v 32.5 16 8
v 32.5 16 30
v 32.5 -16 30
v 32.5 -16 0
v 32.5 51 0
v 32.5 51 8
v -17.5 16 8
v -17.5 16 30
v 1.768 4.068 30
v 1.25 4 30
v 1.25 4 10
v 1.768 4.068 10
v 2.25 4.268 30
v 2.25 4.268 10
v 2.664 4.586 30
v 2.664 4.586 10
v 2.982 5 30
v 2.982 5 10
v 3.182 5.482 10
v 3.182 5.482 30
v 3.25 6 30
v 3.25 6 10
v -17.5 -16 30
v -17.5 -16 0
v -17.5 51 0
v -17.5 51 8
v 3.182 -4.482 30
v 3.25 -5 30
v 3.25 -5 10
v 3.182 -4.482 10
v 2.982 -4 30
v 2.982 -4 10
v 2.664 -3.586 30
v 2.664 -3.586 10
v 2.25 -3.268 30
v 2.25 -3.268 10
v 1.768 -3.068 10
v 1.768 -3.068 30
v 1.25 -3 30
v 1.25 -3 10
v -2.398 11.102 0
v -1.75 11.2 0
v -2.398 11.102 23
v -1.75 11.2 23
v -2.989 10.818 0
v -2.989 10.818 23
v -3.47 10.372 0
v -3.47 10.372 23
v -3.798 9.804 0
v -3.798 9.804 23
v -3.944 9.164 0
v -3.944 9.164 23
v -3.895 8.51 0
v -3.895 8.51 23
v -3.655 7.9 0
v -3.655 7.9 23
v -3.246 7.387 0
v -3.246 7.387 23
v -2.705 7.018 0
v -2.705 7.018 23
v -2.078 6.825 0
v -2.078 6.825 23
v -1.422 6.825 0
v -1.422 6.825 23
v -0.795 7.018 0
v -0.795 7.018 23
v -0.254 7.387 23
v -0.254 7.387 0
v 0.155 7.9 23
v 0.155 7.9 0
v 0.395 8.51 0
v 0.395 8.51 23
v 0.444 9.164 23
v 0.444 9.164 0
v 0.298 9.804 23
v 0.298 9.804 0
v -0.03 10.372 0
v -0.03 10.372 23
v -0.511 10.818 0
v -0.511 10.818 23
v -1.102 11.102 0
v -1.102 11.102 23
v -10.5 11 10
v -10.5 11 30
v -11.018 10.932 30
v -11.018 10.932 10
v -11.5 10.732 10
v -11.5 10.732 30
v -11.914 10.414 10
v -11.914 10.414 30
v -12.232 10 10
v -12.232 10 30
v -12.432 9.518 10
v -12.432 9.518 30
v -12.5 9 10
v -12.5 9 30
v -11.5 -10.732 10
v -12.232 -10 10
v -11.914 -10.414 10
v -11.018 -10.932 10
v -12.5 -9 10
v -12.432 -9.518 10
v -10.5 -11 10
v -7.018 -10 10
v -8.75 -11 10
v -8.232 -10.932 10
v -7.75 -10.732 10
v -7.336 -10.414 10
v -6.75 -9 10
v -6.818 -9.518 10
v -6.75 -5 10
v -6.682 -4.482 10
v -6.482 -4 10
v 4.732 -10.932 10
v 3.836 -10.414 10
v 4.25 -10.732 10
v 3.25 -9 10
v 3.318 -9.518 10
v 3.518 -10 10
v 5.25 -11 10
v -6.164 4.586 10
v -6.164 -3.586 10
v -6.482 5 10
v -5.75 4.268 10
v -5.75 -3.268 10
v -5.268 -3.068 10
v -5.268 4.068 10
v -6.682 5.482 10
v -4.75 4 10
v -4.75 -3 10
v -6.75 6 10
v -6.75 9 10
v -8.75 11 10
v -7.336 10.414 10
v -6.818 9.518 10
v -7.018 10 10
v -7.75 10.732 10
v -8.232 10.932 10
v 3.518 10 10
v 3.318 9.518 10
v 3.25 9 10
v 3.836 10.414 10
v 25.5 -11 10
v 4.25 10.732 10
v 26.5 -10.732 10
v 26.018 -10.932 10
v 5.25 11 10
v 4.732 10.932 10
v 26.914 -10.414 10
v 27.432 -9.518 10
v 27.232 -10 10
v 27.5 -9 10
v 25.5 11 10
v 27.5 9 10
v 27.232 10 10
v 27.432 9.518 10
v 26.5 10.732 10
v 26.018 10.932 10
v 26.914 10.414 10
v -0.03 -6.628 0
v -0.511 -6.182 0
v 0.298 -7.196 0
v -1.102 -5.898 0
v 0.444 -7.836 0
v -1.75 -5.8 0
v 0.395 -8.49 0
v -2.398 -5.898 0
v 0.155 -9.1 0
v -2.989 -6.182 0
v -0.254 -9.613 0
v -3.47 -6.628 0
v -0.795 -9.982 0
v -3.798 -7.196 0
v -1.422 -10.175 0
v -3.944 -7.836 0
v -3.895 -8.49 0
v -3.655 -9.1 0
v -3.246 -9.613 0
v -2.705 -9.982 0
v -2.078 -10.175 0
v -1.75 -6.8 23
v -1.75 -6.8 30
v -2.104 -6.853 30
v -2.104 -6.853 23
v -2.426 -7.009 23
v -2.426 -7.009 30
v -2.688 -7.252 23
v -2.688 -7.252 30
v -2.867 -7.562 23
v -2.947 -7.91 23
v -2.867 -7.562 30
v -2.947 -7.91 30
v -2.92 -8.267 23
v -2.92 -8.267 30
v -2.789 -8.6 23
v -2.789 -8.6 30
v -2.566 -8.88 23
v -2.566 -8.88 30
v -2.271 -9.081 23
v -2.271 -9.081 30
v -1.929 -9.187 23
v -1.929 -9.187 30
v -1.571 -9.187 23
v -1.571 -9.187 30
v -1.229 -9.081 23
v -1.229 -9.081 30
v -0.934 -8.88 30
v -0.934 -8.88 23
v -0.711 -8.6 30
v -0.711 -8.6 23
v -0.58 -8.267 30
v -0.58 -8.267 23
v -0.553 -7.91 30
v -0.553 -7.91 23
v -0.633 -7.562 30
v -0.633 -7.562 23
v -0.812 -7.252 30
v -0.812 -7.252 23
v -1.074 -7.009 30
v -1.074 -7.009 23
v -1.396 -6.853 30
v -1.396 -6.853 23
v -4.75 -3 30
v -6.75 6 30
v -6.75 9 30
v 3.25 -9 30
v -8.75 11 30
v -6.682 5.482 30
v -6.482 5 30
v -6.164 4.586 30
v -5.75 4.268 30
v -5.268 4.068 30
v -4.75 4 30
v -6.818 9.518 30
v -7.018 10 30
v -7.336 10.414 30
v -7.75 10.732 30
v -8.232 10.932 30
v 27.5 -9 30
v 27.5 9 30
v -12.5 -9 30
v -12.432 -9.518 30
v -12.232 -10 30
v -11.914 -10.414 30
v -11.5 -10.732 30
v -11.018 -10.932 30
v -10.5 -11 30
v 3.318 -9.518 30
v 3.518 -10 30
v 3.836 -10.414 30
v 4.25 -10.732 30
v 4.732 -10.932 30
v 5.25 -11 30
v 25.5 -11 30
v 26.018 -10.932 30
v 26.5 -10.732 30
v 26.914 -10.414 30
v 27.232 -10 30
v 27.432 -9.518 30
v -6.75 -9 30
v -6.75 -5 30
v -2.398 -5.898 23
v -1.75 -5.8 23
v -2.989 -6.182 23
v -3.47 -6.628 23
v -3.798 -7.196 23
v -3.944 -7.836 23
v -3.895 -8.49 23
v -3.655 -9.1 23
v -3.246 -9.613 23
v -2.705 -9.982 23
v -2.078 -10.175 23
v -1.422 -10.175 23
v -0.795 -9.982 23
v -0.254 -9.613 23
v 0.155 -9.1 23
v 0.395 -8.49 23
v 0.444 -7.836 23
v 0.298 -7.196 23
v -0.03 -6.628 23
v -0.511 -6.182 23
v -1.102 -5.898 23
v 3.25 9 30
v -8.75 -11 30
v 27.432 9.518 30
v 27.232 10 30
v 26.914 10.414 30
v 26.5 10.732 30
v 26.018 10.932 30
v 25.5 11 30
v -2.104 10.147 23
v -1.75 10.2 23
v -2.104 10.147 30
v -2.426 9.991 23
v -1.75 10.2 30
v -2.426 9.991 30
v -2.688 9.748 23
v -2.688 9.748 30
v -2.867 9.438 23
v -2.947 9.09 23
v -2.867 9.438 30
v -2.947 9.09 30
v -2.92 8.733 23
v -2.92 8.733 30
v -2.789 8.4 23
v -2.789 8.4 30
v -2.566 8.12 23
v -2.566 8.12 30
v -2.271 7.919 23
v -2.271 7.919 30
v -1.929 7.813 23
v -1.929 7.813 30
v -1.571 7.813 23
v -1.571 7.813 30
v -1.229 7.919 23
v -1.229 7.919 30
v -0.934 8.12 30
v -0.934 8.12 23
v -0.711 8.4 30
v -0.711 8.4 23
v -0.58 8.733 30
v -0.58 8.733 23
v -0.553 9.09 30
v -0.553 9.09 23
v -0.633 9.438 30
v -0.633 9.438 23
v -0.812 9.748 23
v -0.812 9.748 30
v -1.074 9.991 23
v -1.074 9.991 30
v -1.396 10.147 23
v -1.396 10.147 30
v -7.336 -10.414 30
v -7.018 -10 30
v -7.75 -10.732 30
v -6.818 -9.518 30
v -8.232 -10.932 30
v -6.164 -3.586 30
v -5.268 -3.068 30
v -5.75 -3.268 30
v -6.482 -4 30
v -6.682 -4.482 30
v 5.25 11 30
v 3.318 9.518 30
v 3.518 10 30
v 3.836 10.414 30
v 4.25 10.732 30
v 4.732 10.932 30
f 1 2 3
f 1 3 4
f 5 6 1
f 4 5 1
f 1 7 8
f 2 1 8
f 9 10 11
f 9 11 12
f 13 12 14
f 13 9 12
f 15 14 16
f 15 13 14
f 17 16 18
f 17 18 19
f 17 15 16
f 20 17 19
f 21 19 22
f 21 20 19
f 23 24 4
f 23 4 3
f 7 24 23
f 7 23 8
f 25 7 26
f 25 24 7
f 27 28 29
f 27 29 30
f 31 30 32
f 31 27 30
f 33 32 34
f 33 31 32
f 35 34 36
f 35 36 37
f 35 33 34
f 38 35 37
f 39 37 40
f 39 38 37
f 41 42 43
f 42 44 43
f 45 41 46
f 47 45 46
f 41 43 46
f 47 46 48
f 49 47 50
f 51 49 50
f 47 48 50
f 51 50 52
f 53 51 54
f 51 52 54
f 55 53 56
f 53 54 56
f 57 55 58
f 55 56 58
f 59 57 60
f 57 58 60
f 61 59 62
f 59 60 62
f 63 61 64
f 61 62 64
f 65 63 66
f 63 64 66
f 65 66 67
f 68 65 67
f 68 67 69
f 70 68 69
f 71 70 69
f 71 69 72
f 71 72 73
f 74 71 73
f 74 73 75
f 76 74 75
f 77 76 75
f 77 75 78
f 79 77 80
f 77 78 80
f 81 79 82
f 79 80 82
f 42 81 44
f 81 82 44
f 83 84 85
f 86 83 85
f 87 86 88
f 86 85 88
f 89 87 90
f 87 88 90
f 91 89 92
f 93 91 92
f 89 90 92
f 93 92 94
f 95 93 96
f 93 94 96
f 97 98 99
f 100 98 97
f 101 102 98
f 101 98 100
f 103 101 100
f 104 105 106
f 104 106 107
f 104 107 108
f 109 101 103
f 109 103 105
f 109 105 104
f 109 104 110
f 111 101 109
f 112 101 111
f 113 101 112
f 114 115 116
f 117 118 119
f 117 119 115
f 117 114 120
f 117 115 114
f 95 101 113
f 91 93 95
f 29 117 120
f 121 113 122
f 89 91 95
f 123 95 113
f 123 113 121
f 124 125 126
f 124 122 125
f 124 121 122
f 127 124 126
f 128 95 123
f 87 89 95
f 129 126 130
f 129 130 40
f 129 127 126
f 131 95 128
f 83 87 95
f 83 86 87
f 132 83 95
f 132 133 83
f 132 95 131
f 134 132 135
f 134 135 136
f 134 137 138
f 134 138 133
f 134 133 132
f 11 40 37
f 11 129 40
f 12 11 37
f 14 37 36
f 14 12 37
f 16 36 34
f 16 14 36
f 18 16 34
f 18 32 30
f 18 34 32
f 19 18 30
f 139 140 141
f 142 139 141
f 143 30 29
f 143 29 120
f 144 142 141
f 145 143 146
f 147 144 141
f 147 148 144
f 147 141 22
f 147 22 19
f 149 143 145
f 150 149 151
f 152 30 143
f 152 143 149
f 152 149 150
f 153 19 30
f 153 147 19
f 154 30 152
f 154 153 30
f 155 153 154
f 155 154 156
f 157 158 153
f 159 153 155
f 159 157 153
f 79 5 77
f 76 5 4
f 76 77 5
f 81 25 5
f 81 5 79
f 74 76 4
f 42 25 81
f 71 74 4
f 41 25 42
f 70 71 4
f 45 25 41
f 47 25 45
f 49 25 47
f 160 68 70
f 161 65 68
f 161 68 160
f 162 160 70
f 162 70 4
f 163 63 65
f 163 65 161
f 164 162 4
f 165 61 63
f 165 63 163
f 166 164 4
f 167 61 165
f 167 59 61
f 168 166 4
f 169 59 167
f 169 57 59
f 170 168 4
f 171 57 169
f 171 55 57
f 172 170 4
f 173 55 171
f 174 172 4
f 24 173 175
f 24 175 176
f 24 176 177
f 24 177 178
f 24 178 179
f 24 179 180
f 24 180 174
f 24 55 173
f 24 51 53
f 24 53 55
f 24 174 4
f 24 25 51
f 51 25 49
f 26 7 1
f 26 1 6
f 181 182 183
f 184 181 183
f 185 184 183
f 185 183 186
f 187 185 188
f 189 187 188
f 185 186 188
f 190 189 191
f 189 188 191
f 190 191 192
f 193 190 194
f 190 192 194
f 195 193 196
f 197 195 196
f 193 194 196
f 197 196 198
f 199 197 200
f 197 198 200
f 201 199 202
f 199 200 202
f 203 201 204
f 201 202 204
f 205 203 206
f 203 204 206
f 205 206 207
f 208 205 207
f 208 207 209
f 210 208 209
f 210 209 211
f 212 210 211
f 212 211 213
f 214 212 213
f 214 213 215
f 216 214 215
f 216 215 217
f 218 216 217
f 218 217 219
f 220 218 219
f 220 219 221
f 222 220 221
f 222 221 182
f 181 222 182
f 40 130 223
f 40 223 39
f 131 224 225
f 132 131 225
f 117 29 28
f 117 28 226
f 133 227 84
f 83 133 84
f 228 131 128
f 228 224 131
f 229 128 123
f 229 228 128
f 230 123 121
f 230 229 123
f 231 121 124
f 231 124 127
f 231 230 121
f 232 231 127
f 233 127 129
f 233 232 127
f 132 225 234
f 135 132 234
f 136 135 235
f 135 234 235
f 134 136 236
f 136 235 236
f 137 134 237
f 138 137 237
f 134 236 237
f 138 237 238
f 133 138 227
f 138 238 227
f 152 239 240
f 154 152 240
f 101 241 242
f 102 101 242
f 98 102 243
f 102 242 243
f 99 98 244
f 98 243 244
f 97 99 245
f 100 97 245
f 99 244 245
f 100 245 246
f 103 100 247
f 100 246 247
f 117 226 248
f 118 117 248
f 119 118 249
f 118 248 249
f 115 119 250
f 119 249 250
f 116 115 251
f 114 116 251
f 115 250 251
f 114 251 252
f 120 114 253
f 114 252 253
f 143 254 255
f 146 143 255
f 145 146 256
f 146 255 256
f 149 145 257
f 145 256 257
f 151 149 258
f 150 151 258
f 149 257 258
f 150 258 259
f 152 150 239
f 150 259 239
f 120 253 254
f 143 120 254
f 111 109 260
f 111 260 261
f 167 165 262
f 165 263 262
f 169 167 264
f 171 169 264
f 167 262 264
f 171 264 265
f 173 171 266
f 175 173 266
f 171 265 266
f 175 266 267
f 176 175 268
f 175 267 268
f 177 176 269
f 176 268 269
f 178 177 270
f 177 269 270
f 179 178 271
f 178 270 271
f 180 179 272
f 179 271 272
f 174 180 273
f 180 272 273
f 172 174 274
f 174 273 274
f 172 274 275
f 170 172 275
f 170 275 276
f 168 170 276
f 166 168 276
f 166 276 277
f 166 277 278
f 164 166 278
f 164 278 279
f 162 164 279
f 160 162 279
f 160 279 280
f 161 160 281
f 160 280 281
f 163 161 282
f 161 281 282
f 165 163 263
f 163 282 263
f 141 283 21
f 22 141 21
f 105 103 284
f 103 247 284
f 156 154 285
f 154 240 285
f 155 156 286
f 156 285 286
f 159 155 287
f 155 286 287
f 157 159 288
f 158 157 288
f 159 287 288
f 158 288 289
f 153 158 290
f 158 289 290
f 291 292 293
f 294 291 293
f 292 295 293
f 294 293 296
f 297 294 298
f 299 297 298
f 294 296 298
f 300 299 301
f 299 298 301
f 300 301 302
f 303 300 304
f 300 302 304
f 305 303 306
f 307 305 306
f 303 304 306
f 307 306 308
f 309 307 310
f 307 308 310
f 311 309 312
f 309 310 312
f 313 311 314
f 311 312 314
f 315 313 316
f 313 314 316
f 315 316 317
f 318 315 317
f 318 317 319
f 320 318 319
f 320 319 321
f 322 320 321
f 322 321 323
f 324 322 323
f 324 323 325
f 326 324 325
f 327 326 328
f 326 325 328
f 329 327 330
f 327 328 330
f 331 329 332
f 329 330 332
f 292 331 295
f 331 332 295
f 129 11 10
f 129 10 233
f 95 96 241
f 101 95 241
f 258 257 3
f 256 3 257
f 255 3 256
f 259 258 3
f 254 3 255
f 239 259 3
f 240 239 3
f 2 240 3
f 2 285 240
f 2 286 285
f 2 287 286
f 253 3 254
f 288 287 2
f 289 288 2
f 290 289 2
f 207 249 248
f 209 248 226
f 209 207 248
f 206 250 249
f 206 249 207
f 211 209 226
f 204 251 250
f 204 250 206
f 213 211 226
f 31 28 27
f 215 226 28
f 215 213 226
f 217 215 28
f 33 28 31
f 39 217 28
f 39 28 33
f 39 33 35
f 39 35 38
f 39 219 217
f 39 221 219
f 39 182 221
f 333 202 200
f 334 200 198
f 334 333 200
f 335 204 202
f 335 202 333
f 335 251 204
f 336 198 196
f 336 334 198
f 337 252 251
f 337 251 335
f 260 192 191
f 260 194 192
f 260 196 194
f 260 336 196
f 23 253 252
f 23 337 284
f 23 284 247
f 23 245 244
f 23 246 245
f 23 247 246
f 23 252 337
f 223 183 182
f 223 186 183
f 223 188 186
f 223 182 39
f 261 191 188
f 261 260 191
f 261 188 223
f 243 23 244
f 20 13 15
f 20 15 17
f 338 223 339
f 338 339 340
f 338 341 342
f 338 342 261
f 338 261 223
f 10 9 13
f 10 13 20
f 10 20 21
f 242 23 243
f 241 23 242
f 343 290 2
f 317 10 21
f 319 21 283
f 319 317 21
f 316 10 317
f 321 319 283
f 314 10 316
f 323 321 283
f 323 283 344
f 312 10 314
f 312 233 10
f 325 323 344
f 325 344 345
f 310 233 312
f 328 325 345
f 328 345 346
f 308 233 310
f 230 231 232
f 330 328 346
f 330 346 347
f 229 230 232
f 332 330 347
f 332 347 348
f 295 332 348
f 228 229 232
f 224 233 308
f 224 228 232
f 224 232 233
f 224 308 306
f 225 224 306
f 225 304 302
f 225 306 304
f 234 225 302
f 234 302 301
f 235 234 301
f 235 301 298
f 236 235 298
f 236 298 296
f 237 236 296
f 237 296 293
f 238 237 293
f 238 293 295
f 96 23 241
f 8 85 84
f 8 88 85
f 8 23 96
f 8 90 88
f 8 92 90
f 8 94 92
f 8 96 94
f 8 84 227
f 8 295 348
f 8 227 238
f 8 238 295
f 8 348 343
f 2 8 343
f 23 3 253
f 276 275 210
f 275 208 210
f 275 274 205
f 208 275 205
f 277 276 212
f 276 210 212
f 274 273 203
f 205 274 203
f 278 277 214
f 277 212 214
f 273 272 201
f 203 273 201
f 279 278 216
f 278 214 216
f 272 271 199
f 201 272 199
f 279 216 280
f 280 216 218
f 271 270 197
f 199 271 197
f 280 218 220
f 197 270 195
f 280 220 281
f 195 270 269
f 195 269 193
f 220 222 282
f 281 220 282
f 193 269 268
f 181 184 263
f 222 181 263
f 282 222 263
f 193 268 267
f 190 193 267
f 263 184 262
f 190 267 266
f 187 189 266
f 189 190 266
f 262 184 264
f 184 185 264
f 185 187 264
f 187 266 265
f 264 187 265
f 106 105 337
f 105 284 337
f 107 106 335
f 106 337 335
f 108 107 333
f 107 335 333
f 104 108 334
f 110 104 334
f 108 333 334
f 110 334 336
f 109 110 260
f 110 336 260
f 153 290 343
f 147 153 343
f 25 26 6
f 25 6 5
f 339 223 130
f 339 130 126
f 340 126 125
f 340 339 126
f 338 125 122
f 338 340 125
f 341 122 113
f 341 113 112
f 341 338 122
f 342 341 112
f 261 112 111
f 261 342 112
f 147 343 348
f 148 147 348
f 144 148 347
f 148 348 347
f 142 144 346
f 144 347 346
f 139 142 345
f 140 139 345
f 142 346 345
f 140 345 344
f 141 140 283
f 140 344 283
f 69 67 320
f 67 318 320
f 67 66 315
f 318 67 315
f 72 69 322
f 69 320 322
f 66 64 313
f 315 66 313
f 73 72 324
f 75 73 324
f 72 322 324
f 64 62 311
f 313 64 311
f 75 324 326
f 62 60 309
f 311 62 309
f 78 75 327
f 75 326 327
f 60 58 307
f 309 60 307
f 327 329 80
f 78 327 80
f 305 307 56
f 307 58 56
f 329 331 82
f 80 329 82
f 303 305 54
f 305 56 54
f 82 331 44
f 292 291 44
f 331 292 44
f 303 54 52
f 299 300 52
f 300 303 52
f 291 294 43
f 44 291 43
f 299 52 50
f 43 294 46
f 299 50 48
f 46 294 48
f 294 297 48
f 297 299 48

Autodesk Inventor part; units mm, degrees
ref_plane "YZ Plane" through (0, 0, 0) normal (1, 0, 0) x (0, 1, 0)
ref_plane "XZ Plane" through (0, 0, 0) normal (0, 1, 0) x (-1, 0, 0)
ref_plane "XY Plane" through (0, 0, 0) normal (0, 0, 1) x (1, 0, 0)
sketch "Sketch1" plane through (0, 0, 0) normal (0, 0, 1) x (1, 0, 0)
  line L0 (-17.5, 16) -> (17.5, 16)
  line L1 (17.5, 16) -> (17.5, -16)
  line L2 (17.5, -16) -> (-17.5, -16)
  line L3 (-17.5, -16) -> (-17.5, 16)
  point P0 (0, 0)
  dimension "d0" = 35
  dimension "d1" = 32
  dimension "d2" = 16
  dimension "d3" = 17.5
extrude "Extrusion1" add sketch "Sketch1" along normal blind 30
sketch "Sketch2" plane through (-17.5, 16, 0) normal (0, 1, 0) x (1, 0, 0)
  line L0 (0, 0) -> (35, 0) projected
  line L1 (0, 0) -> (0, -30) projected
  line L2 (35, -30) -> (0, -30) projected
  line L3 (35, 0) -> (35, -30) projected
  line L4 (0, 0) -> (0, -30) projected
  line L5 (35, 0) -> (35, -30) projected
  line L6 (0, 0) -> (35, 0)
  line L7 (35, 0) -> (35, -8)
  line L8 (35, -8) -> (0, -8)
  line L9 (0, -8) -> (0, 0)
  point P0 (17.5, 0)
  dimension "d6" = 8
extrude "Extrusion2" add sketch "Sketch2" along normal blind 35 contours L0 L3 L8 L1
sketch "Sketch3" plane through (0, 0, 0) normal (0, 0, -1) x (-1, 0, 0)
  circle A0 centre (1.75, -8) radius 0.7835 projected
  circle A1 centre (1.75, 9) radius 0.7835 projected
  point P0 (0, 0)
hole "Hole1" at (-1.75, 9, 0) at (-1.75, -8, 0) direction (0, 0, 1) diameter 2.4 end through all counterbore diameter 4.4 counterbore depth 23 clearance for "Socket Head Cap Screw" size "M2" standard "Ansi Metric M Profile"
sketch "Sketch4" plane through (17.5, -16, 30) normal (1, 0, 0) x (0, 0, -1)
  line L0 (30, 67) -> (30, 0) projected
  line L1 (22, 67) -> (30, 67) projected
  line L2 (22, 32) -> (22, 67) projected
  line L3 (22, 32) -> (0, 32) projected
  line L4 (0, 0) -> (0, 32) projected
  line L5 (30, 0) -> (0, 0) projected
  point P0 (30, 16)
extrude "Extrusion3" add sketch "Sketch4" along normal blind 15
sketch "Sketch7" plane through (0, 0, 30) normal (0, 0, 1) x (1, 0, 0)
  circle A0 centre (-1.75, 9) radius 1.2 projected
  circle A1 centre (-1.75, -8) radius 1.2 projected
  line L0 (-17.5, 16) -> (32.5, 16) projected
  line L1 (-17.5, 16) -> (-17.5, -16) projected
  line L2 (-17.5, -16) -> (32.5, -16) projected
  line L3 (32.5, 16) -> (32.5, -16) projected
  line L4 (-6.75, -9) -> (-6.75, -5)
  line L5 (-4.75, -3) -> (1.25, -3)
  line L6 (3.25, -5) -> (3.25, -9)
  line L7 (5.25, -11) -> (25.5, -11)
  line L8 (27.5, -9) -> (27.5, 9)
  line L9 (25.5, 11) -> (5.25, 11)
  line L10 (3.25, 9) -> (3.25, 6)
  line L11 (1.25, 4) -> (-4.75, 4)
  line L12 (-6.75, 6) -> (-6.75, 9)
  line L13 (-8.75, 11) -> (-10.5, 11)
  line L14 (-12.5, 9) -> (-12.5, -9)
  line L15 (-10.5, -11) -> (-8.75, -11)
  arc A2 (-4.75, -3) -> (-6.75, -5) centre (-4.75, -5) ccw
  arc A3 (-8.75, -11) -> (-6.75, -9) centre (-8.75, -9) ccw
  arc A4 (-12.5, -9) -> (-10.5, -11) centre (-10.5, -9) ccw
  arc A5 (-10.5, 11) -> (-12.5, 9) centre (-10.5, 9) ccw
  arc A6 (-6.75, 9) -> (-8.75, 11) centre (-8.75, 9) ccw
  arc A7 (-6.75, 6) -> (-4.75, 4) centre (-4.75, 6) ccw
  arc A8 (1.25, 4) -> (3.25, 6) centre (1.25, 6) ccw
  arc A9 (5.25, 11) -> (3.25, 9) centre (5.25, 9) ccw
  arc A10 (27.5, 9) -> (25.5, 11) centre (25.5, 9) ccw
  arc A11 (25.5, -11) -> (27.5, -9) centre (25.5, -9) ccw
  arc A12 (3.25, -9) -> (5.25, -11) centre (5.25, -9) ccw
  arc A13 (3.25, -5) -> (1.25, -3) centre (1.25, -5) ccw
  point P0 (0, 0)
  point P1 (3.25, 11)
  point P2 (3.25, 4)
  point P3 (-6.75, 4)
  point P4 (-6.75, 11)
  point P5 (-12.5, -11)
  dimension "d18" = 5
  dimension "d19" = 5
  dimension "d21" = 5
  dimension "d22" = 5
  dimension "d23" = 5
  dimension "d24" = 5
  dimension "d25" = 5
  dimension "d26" = 5
  dimension "d27" = 5
  dimension "d28" = 2
  dimension "d29" = 2
extrude "Extrusion4" cut sketch "Sketch7" against normal blind 20 contours A3 L15 A4 L14 A5 L13 A6 L12 A7 L11 A8 L10 A9 L9 A10 L8 A11 L7 A12 L6 A13 L5 A2 L4
equation "\"d2\" = 0.5 * d1"
equation "\"d3\" = 0.5 * d0"
properties part number "zgalvo_cover"
